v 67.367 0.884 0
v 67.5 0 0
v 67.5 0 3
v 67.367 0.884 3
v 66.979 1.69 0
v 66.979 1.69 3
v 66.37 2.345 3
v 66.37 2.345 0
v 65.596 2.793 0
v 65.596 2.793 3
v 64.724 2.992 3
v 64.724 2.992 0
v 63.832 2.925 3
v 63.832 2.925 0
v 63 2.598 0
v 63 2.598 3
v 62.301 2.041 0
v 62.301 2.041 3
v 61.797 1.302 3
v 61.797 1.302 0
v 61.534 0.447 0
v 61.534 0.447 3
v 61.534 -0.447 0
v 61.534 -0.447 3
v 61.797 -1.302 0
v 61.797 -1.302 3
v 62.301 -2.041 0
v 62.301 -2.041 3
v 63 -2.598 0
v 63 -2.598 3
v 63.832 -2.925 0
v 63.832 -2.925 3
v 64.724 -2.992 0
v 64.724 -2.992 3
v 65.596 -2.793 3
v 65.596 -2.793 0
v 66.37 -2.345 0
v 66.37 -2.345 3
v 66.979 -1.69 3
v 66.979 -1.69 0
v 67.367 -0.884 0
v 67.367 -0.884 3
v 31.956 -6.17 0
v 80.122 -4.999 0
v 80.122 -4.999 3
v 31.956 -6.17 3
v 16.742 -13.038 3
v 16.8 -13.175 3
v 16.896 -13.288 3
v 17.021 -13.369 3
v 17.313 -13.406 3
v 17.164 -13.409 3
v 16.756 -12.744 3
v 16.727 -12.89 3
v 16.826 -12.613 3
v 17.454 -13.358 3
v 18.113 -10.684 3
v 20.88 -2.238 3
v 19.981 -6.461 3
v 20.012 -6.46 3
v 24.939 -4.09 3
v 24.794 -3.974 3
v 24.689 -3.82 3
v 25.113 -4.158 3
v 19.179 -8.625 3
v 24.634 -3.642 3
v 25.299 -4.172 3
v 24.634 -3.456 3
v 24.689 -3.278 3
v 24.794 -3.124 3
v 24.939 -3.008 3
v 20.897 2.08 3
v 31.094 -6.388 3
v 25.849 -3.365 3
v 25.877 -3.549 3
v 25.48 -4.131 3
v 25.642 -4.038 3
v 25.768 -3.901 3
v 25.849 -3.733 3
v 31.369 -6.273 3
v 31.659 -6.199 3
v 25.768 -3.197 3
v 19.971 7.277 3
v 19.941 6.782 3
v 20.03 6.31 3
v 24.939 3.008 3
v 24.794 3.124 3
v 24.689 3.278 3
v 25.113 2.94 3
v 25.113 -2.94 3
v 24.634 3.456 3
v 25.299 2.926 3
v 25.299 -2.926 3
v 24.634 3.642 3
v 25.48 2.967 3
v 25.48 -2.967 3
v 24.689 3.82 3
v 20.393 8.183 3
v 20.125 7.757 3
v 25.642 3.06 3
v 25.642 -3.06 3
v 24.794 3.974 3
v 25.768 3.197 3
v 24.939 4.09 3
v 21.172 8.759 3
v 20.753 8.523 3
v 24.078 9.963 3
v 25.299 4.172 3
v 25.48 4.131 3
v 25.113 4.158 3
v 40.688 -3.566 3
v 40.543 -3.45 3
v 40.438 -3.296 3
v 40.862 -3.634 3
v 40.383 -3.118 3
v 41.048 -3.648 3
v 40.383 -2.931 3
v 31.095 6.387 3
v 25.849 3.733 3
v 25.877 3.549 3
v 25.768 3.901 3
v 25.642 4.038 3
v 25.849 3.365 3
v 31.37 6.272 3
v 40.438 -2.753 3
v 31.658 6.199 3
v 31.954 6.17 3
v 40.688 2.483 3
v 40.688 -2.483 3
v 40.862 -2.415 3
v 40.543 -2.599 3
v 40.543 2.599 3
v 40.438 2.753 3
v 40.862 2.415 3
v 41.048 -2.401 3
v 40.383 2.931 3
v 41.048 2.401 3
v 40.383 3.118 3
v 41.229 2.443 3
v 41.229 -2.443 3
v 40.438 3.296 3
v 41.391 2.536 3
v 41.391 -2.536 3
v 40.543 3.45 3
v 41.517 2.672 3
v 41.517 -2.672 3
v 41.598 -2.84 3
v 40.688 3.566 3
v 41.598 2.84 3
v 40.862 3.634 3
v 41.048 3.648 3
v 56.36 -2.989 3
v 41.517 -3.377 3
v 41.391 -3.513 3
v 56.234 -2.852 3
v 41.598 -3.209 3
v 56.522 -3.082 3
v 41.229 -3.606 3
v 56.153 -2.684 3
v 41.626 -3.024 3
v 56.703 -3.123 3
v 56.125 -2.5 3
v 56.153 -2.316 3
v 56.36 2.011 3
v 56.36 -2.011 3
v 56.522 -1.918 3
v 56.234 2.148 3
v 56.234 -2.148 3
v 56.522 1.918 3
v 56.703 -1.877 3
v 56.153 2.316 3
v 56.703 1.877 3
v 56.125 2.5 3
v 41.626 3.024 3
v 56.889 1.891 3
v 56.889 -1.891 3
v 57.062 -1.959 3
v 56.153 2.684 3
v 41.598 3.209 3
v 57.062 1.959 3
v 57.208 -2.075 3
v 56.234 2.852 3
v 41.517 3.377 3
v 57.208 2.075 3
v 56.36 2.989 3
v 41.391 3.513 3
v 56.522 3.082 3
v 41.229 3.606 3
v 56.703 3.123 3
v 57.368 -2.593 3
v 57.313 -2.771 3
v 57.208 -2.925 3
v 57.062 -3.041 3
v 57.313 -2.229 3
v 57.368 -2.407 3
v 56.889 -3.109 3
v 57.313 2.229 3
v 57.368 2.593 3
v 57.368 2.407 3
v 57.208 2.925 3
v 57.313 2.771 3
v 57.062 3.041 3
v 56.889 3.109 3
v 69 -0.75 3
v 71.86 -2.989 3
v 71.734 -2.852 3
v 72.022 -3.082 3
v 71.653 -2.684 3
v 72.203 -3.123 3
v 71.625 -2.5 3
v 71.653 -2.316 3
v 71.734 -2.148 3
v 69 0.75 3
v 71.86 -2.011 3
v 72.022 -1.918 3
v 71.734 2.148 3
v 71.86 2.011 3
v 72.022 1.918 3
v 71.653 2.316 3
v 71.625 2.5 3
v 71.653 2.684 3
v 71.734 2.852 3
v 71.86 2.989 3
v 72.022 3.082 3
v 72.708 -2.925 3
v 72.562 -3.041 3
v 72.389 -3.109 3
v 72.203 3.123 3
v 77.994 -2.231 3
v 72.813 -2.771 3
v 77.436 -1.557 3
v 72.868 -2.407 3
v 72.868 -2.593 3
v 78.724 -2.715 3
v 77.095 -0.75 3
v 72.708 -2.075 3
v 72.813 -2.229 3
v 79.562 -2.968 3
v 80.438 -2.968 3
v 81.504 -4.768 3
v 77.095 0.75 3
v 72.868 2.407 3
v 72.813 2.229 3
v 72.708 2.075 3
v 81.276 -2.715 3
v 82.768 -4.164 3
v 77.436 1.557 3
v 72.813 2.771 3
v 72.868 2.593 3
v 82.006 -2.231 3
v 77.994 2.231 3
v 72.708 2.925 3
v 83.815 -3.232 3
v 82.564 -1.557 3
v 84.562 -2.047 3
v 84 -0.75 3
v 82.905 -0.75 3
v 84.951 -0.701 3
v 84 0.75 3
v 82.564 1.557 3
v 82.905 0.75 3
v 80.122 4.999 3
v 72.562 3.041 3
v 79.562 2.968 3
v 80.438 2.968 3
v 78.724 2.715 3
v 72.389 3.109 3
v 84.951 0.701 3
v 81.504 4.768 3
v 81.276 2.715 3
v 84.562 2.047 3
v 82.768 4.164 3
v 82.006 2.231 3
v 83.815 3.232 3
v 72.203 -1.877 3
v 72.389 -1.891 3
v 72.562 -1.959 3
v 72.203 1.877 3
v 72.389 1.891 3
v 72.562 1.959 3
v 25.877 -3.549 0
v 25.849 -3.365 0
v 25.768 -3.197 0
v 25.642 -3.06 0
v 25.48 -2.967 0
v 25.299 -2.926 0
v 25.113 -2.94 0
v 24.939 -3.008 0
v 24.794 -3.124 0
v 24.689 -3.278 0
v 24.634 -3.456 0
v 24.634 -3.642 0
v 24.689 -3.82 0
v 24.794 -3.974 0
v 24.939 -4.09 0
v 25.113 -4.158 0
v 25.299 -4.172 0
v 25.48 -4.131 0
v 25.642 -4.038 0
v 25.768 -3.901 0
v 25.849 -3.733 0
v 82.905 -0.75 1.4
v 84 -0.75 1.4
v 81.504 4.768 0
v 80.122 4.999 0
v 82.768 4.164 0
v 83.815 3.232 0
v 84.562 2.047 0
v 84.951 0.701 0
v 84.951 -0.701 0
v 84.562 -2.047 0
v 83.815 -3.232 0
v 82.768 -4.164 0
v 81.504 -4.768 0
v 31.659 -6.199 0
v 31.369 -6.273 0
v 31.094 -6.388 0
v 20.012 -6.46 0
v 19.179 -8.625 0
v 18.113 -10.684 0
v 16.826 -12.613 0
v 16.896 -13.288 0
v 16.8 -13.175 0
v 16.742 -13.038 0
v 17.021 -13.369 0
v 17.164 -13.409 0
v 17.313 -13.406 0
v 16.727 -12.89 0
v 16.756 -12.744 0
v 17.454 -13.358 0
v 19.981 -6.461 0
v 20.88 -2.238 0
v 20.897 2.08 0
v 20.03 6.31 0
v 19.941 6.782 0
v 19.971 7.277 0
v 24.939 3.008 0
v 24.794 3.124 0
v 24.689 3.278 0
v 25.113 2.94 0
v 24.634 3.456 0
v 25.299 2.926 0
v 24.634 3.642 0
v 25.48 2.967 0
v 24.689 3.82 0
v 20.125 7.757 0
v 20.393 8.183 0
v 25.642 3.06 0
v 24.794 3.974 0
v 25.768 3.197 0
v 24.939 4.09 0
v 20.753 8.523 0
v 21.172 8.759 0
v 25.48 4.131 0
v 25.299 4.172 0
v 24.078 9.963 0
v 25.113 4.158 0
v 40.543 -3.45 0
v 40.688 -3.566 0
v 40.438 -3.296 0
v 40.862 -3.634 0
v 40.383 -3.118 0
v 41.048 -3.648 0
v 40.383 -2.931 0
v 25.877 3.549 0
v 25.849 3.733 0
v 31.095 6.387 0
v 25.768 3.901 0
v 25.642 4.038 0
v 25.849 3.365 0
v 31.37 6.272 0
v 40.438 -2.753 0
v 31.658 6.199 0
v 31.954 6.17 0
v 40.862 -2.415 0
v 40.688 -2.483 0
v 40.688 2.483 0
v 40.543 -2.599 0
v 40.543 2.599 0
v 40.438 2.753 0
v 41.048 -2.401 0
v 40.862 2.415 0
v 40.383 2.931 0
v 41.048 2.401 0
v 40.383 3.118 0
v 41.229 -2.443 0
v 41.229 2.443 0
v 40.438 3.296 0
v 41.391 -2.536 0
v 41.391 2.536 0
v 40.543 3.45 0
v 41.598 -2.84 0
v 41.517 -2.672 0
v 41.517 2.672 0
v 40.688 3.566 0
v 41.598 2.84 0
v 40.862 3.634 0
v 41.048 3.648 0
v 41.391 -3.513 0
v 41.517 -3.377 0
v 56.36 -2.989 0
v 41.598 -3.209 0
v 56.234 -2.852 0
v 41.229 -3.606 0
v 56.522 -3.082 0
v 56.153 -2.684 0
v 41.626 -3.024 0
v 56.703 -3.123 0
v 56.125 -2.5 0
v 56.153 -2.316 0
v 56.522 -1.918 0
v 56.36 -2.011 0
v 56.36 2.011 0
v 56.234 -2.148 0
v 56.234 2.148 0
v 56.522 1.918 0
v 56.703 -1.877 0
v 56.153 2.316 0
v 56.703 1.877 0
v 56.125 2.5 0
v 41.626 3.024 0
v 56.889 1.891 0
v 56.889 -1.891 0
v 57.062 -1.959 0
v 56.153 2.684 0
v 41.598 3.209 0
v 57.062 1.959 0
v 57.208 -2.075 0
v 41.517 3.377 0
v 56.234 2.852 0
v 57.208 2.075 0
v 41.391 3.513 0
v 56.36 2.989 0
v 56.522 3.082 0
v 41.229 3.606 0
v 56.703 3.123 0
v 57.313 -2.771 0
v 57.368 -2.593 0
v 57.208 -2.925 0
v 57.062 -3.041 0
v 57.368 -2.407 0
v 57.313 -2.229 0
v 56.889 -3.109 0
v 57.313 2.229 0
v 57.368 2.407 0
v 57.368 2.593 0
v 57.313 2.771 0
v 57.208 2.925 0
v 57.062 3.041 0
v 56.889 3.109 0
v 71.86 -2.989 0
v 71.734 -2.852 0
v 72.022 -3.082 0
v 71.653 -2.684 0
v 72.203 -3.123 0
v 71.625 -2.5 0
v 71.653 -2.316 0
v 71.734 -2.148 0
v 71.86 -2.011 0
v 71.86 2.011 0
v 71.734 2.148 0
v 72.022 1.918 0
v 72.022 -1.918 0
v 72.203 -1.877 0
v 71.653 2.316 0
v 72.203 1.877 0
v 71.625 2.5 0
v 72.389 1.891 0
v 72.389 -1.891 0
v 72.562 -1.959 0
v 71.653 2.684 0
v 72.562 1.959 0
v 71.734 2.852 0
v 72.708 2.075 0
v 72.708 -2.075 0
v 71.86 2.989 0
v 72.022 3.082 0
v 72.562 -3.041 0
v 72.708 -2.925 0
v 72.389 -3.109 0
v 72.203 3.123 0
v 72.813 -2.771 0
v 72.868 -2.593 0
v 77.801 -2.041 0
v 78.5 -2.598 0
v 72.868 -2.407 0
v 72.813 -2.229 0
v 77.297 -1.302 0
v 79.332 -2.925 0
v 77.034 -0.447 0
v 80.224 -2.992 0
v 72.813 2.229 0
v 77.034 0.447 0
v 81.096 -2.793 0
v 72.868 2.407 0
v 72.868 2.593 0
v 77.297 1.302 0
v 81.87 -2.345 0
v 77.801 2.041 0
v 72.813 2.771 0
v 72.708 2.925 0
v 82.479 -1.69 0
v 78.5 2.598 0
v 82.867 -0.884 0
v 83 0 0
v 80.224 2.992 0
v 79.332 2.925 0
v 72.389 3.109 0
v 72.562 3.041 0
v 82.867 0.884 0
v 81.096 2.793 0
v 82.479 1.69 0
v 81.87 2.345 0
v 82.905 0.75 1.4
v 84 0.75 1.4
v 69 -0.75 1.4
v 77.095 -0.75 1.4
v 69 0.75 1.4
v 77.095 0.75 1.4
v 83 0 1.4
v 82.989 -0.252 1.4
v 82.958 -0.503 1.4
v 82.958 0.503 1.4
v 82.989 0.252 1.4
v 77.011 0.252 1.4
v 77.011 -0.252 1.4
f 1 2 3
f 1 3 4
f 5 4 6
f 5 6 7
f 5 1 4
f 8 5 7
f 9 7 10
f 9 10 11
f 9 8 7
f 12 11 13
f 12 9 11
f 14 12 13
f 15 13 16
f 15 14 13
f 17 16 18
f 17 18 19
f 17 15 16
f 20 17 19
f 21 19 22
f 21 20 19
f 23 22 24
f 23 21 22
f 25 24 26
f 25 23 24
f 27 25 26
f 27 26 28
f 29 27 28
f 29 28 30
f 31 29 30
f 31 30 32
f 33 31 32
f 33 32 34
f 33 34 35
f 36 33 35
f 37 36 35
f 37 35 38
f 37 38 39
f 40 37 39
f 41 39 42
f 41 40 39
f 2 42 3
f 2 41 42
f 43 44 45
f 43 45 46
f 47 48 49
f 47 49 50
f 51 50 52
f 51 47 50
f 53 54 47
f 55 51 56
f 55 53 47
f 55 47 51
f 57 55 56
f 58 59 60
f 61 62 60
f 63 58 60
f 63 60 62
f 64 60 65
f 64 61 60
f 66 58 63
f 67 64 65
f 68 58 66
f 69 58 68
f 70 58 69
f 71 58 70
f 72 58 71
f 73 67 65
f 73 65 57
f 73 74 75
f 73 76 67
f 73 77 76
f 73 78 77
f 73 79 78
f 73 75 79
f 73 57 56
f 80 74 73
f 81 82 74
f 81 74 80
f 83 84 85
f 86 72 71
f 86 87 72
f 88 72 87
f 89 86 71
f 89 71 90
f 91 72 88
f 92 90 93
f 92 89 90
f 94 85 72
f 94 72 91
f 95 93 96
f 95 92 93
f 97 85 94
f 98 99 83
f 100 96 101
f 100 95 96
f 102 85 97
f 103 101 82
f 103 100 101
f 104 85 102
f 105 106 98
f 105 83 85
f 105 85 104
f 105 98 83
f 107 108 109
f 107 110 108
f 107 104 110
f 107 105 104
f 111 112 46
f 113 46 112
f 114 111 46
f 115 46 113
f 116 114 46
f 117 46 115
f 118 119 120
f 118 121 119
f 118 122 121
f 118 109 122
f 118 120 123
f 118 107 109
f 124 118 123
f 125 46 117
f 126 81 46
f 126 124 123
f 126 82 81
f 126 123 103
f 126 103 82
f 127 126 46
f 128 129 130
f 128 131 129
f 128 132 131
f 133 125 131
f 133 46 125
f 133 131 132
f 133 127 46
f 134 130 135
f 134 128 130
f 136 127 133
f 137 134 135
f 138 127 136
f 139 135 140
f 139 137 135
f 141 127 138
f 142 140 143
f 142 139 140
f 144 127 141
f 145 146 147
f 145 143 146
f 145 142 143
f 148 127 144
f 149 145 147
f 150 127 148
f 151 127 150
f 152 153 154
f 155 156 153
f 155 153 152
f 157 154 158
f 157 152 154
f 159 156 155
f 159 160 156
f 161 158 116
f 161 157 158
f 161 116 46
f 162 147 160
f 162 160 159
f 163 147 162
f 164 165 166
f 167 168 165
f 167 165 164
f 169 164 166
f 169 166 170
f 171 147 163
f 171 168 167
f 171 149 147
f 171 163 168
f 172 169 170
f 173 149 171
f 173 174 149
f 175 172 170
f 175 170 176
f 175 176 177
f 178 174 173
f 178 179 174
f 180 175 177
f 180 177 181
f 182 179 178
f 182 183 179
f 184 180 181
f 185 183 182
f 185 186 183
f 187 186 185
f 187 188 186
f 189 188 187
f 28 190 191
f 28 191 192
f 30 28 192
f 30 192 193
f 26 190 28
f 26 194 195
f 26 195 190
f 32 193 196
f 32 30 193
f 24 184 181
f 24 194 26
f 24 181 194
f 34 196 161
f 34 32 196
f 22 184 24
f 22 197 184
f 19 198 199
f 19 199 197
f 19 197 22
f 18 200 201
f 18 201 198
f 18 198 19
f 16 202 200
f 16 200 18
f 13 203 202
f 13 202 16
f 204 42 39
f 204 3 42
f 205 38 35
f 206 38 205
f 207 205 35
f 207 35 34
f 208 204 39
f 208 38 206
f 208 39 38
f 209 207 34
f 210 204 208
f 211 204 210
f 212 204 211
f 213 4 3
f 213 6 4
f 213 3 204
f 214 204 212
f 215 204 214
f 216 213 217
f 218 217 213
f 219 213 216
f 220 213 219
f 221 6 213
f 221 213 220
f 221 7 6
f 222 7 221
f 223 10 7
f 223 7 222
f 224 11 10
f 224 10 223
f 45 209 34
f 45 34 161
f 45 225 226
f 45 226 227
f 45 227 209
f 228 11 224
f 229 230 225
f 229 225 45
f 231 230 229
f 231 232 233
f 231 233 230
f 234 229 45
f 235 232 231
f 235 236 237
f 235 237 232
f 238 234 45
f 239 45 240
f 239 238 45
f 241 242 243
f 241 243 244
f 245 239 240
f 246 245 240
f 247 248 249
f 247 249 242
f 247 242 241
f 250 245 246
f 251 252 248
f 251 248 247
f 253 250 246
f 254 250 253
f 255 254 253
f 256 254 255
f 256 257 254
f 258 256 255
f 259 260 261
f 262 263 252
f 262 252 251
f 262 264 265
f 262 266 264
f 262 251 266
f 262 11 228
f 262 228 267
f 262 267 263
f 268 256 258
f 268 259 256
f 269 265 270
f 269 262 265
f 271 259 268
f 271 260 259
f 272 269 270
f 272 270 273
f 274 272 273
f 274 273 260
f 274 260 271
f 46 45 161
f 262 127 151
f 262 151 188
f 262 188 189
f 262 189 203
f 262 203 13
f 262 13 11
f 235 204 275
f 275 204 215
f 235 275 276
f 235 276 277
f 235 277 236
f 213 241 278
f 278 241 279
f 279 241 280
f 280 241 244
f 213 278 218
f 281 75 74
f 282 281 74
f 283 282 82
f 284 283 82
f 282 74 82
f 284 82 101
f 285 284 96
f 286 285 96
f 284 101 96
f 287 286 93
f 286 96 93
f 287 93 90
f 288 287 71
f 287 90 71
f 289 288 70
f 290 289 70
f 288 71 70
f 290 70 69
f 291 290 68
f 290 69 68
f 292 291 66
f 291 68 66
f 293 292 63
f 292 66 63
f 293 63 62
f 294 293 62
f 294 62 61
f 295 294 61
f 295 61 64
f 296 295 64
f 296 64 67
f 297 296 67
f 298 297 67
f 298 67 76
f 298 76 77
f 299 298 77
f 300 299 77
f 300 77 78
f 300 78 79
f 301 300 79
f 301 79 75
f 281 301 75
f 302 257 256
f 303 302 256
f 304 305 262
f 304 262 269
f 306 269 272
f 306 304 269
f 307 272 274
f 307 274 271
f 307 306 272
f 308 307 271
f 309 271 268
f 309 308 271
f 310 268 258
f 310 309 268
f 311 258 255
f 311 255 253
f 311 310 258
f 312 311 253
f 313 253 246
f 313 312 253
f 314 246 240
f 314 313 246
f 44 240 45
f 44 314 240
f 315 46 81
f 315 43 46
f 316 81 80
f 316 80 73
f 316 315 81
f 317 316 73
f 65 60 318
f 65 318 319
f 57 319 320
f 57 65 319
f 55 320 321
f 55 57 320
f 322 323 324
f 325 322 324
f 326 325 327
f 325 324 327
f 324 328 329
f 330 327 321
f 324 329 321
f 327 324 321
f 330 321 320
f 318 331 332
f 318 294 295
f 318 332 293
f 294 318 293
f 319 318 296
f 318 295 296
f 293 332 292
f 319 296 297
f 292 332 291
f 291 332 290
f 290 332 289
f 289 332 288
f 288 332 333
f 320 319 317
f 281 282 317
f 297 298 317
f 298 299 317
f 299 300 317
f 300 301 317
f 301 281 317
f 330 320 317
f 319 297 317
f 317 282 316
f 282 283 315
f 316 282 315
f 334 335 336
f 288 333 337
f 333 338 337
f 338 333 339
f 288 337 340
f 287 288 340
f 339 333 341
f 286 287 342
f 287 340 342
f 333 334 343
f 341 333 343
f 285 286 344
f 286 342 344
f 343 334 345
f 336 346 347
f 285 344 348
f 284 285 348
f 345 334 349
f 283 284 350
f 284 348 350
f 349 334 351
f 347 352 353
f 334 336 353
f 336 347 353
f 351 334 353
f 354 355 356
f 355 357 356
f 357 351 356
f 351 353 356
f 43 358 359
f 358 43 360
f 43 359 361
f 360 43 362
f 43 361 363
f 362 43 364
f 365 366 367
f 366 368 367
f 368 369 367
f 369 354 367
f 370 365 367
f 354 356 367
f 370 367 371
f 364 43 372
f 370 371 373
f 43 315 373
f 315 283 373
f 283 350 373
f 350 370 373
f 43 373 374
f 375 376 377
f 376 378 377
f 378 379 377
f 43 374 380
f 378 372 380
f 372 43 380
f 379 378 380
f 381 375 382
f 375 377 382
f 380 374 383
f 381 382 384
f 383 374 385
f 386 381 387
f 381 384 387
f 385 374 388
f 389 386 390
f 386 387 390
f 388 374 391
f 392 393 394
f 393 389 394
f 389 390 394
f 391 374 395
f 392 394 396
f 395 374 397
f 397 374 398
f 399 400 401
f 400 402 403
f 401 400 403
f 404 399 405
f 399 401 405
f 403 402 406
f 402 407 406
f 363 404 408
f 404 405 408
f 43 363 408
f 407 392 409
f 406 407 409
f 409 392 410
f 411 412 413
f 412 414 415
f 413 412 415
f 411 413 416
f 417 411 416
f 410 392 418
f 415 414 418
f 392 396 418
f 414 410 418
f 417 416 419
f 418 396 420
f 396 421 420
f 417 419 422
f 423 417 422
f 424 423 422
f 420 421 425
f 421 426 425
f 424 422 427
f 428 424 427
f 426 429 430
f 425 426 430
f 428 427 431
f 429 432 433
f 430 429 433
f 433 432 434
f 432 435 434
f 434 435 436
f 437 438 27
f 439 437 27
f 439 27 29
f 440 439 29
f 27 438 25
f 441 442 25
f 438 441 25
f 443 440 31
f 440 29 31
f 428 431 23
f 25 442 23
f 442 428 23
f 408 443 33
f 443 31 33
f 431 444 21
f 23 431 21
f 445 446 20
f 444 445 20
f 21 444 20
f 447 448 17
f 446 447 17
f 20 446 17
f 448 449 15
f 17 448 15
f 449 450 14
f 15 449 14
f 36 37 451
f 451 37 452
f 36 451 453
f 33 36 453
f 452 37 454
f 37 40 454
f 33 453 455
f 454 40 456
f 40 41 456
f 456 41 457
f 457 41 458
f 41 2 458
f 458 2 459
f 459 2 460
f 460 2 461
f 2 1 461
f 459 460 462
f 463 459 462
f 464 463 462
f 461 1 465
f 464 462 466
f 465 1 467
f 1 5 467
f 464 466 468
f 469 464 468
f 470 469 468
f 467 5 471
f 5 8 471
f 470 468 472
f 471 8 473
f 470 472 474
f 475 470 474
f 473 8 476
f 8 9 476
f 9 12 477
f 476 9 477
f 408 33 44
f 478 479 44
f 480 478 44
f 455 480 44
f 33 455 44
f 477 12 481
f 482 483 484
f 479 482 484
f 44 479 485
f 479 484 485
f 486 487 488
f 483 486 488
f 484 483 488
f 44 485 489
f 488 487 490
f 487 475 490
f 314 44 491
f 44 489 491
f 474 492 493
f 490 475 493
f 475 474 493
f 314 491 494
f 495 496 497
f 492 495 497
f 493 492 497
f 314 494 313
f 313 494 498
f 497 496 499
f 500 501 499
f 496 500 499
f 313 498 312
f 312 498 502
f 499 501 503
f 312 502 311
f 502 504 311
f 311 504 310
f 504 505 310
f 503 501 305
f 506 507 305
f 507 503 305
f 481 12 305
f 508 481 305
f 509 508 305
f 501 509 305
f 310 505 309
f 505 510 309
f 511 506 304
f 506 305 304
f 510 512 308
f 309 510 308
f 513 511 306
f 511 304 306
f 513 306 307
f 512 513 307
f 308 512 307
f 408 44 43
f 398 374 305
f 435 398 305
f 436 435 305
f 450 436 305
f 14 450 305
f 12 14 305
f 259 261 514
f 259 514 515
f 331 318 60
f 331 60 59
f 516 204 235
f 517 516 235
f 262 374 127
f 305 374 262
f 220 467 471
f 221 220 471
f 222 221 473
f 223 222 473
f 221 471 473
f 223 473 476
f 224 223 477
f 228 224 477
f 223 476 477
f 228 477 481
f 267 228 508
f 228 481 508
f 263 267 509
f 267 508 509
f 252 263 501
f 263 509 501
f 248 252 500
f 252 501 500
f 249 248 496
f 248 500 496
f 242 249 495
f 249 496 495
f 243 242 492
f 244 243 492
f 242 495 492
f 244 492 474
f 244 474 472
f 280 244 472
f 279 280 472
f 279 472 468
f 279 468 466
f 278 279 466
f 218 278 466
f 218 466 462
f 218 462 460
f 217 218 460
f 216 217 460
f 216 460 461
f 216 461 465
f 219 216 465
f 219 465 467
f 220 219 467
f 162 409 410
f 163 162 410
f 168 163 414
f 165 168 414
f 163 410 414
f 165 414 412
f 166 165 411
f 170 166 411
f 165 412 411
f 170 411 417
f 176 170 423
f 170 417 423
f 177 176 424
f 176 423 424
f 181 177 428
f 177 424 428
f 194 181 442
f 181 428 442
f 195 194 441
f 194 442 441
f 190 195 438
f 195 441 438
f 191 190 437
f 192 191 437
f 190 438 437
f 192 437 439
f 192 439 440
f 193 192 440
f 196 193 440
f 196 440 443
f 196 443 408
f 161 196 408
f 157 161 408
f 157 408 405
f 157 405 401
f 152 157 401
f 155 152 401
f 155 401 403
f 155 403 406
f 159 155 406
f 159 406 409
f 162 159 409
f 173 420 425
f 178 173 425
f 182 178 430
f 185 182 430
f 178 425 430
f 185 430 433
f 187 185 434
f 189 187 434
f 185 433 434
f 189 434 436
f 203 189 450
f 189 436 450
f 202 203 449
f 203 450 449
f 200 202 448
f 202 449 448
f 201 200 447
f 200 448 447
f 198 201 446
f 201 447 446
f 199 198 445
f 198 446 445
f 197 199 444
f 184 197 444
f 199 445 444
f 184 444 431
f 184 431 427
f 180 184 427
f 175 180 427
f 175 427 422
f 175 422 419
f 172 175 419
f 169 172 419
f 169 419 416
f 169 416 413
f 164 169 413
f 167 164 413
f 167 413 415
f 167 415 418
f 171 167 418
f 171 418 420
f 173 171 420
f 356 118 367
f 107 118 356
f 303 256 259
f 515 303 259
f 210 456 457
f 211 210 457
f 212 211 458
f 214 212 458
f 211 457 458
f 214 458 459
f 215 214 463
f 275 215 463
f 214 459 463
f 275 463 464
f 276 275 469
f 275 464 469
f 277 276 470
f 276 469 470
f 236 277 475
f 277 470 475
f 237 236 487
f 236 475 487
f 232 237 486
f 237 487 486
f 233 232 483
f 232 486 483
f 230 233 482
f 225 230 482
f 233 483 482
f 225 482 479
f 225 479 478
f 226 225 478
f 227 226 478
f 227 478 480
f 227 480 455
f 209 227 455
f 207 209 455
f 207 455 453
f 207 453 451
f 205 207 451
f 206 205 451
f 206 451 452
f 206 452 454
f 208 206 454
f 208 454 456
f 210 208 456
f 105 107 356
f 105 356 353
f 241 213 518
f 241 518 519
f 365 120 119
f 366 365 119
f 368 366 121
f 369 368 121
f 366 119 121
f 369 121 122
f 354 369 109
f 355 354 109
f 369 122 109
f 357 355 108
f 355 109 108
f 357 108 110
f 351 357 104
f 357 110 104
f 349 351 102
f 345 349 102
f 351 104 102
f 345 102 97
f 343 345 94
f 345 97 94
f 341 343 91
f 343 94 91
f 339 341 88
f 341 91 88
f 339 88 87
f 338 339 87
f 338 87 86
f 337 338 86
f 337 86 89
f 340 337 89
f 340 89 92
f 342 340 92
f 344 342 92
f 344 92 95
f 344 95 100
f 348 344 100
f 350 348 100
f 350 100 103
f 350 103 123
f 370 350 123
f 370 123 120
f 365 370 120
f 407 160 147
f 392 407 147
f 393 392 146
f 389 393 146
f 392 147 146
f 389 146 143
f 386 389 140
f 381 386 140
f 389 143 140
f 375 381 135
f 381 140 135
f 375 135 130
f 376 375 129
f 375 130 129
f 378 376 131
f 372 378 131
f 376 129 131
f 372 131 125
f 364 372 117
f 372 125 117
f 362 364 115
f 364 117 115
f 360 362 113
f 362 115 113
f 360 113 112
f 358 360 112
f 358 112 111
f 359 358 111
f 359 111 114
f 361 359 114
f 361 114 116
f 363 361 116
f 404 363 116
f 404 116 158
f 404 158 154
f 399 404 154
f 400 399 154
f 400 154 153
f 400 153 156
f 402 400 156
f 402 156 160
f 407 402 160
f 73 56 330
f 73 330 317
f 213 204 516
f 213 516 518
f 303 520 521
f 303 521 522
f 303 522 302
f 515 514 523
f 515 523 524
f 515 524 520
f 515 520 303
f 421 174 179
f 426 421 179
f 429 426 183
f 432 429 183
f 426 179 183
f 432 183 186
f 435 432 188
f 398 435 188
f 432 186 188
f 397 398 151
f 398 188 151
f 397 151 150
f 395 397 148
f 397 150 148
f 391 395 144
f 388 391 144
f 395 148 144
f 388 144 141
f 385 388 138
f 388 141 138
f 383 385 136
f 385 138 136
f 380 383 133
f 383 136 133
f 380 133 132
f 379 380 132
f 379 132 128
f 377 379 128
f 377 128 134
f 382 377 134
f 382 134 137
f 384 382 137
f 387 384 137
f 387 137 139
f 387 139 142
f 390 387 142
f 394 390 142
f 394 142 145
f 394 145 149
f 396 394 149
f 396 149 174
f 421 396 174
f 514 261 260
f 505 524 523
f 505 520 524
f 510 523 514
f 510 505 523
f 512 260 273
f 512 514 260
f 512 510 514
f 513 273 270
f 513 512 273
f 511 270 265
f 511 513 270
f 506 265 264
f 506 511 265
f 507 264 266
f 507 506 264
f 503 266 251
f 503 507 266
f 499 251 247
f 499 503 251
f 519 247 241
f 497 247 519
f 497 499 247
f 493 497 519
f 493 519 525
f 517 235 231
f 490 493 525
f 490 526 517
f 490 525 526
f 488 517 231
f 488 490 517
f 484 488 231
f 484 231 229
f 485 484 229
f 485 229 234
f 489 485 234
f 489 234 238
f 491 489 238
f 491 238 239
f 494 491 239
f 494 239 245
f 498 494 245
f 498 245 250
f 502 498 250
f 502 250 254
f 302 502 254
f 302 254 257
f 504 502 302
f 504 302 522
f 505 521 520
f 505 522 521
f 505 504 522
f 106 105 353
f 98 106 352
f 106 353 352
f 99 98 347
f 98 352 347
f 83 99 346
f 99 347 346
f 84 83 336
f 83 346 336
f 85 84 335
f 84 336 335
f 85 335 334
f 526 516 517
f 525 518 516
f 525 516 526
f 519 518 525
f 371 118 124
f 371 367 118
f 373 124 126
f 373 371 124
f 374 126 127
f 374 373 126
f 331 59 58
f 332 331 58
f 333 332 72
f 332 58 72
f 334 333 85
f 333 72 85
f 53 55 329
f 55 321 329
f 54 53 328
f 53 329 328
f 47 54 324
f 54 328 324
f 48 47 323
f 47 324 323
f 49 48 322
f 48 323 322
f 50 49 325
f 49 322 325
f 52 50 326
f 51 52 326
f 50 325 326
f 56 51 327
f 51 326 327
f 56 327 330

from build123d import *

# Parameters (mm, degrees)
SKETCH1_R                = 13.5
SKETCH1_R_2              = 3
BOSS_EXTRUDE1_DEPTH      = 3
M2_CLEARANCE_HOLE1_D     = 2.4
M2_CLEARANCE_HOLE1_DEPTH = 11.5
CIRPATTERN1_COUNT        = 12
TROU_TARAUD_M1_61_D      = 1.25
ESQUISSE1_R              = 21
ENL_V_MAT_EXTRU_1_DEPTH  = 4
ESQUISSE2_R              = 0.625
ENL_V_MAT_EXTRU_2_DEPTH  = 4
ESQUISSE4_W              = 15
ESQUISSE4_H              = 1.5
ENL_V_MAT_EXTRU_3_DEPTH  = 1.6
ESQUISSE5_R              = 0.625
ENL_V_MAT_EXTRU_4_DEPTH  = 10
BOSS_EXTRU_3_DEPTH       = 3
CONG_2_R                 = 2
CONG_3_R                 = 2
CONG_4_R                 = 0.5


with BuildPart() as part:
    # Sketch1 → Boss-Extrude1 (new body)
    with BuildSketch(Plane.XY):
        with BuildLine():
            Line((18.384776311, 6.5), (80.121567237, 4.998521922))
            ThreePointArc((80.121567237, 4.998521922), (85, 0), (80.121567237, -4.998521922))
            Line((80.121567237, -4.998521922), (18.384776311, -6.5))
            ThreePointArc((18.384776311, -6.5), (-19.5, 0), (18.384776311, 6.5))
        make_face()
        Circle(SKETCH1_R, mode=Mode.SUBTRACT)
        with Locations((64.5, 0)):
            Circle(SKETCH1_R_2, mode=Mode.SUBTRACT)
        with Locations((80, 0)):
            Circle(SKETCH1_R_2, mode=Mode.SUBTRACT)
    extrude(amount=BOSS_EXTRUDE1_DEPTH)

    # M2 Clearance Hole1
    with Locations(Plane.XY.offset(3)):
        with Locations((0, 16.5)):
            m2_clearance_hole1 = Hole(M2_CLEARANCE_HOLE1_D / 2, depth=M2_CLEARANCE_HOLE1_DEPTH)

    # CirPattern1: M2 Clearance Hole1 ×12 about axis
    cirpattern1_axis = Axis((0, 0, 0), (0, 0, 1))
    for i in range(1, CIRPATTERN1_COUNT):
        add(m2_clearance_hole1.rotate(cirpattern1_axis, i * 360 / CIRPATTERN1_COUNT), mode=Mode.SUBTRACT)

    # Trou taraudé M1.61 (through all)
    with Locations(Plane.XY.offset(3)):
        with Locations((56.75, 2.5), (72.25, 2.5), (72.25, -2.5), (56.75, -2.5)):
            Hole(TROU_TARAUD_M1_61_D / 2)

    # Esquisse1 → Enlèv. mat.-Extru.1 (cut, through all)
    with BuildSketch(Plane.XY.offset(3)):
        Circle(ESQUISSE1_R)
    extrude(amount=-ENL_V_MAT_EXTRU_1_DEPTH, mode=Mode.SUBTRACT)

    # Esquisse2 → Enlèv. mat.-Extru.2 (cut, through all)
    with BuildSketch(Plane.XY.offset(3)):
        with Locations((25.251835753, 3.548914074)):
            Circle(ESQUISSE2_R)
        with Locations((25.251835753, -3.548914074)):
            Circle(ESQUISSE2_R)
    extrude(amount=-ENL_V_MAT_EXTRU_2_DEPTH, mode=Mode.SUBTRACT)

    # Esquisse4 → Enlèv. mat.-Extru.3 (cut)
    with BuildSketch(Plane.XY.offset(3)):
        with Locations((76.5, 0)):
            Rectangle(ESQUISSE4_W, ESQUISSE4_H)
    extrude(amount=-ENL_V_MAT_EXTRU_3_DEPTH, mode=Mode.SUBTRACT)

    # Esquisse5 → Enlèv. mat.-Extru.4 (cut)
    with BuildSketch(Plane.XY.offset(3)):
        with Locations((41.000917876, 3.024457037)):
            Circle(ESQUISSE5_R)
        with Locations((41.000917876, -3.024457037)):
            Circle(ESQUISSE5_R)
    extrude(amount=-ENL_V_MAT_EXTRU_4_DEPTH, mode=Mode.SUBTRACT)

    # Esquisse6 → Boss.-Extru.3 (add)
    with BuildSketch(Plane.XY.offset(3)):
        with BuildLine():
            Line((19.981323023, 6.461170967), (31.5, 6.181029406))
            Line((31.5, 6.181029406), (24.077934309, 9.962760764))
            Line((24.077934309, 9.962760764), (19.405232048, 8.027264114))
            ThreePointArc((19.405232048, 8.027264114), (19.708839185, 7.249941929), (19.981323023, 6.461170967))
        make_face()
        with BuildLine():
            Line((15.240466078, -14.489207955), (31.5, -6.181029406))
            Line((31.5, -6.181029406), (20.01179148, -6.460429955))
            ThreePointArc((20.01179148, -6.460429955), (18.077492491, -10.743054438), (15.240466078, -14.489207955))
        make_face()
    extrude(amount=-BOSS_EXTRU_3_DEPTH)

    # Congé2
    cong_2_edges = [part.edges().sort_by_distance(p)[0] for p in [
        (19.405232048, 8.027264114, 1.5),
    ]]
    fillet(cong_2_edges, radius=CONG_2_R)

    # Congé3
    cong_3_edges = [part.edges().sort_by_distance(p)[0] for p in [
        (31.5, 6.181029406, 1.5),
        (31.5, -6.181029406, 1.5),
    ]]
    fillet(cong_3_edges, radius=CONG_3_R)

    # Congé4
    cong_4_edges = [part.edges().sort_by_distance(p)[0] for p in [
        (15.240466078, -14.489207955, 1.5),
    ]]
    fillet(cong_4_edges, radius=CONG_4_R)


solid = part.part
